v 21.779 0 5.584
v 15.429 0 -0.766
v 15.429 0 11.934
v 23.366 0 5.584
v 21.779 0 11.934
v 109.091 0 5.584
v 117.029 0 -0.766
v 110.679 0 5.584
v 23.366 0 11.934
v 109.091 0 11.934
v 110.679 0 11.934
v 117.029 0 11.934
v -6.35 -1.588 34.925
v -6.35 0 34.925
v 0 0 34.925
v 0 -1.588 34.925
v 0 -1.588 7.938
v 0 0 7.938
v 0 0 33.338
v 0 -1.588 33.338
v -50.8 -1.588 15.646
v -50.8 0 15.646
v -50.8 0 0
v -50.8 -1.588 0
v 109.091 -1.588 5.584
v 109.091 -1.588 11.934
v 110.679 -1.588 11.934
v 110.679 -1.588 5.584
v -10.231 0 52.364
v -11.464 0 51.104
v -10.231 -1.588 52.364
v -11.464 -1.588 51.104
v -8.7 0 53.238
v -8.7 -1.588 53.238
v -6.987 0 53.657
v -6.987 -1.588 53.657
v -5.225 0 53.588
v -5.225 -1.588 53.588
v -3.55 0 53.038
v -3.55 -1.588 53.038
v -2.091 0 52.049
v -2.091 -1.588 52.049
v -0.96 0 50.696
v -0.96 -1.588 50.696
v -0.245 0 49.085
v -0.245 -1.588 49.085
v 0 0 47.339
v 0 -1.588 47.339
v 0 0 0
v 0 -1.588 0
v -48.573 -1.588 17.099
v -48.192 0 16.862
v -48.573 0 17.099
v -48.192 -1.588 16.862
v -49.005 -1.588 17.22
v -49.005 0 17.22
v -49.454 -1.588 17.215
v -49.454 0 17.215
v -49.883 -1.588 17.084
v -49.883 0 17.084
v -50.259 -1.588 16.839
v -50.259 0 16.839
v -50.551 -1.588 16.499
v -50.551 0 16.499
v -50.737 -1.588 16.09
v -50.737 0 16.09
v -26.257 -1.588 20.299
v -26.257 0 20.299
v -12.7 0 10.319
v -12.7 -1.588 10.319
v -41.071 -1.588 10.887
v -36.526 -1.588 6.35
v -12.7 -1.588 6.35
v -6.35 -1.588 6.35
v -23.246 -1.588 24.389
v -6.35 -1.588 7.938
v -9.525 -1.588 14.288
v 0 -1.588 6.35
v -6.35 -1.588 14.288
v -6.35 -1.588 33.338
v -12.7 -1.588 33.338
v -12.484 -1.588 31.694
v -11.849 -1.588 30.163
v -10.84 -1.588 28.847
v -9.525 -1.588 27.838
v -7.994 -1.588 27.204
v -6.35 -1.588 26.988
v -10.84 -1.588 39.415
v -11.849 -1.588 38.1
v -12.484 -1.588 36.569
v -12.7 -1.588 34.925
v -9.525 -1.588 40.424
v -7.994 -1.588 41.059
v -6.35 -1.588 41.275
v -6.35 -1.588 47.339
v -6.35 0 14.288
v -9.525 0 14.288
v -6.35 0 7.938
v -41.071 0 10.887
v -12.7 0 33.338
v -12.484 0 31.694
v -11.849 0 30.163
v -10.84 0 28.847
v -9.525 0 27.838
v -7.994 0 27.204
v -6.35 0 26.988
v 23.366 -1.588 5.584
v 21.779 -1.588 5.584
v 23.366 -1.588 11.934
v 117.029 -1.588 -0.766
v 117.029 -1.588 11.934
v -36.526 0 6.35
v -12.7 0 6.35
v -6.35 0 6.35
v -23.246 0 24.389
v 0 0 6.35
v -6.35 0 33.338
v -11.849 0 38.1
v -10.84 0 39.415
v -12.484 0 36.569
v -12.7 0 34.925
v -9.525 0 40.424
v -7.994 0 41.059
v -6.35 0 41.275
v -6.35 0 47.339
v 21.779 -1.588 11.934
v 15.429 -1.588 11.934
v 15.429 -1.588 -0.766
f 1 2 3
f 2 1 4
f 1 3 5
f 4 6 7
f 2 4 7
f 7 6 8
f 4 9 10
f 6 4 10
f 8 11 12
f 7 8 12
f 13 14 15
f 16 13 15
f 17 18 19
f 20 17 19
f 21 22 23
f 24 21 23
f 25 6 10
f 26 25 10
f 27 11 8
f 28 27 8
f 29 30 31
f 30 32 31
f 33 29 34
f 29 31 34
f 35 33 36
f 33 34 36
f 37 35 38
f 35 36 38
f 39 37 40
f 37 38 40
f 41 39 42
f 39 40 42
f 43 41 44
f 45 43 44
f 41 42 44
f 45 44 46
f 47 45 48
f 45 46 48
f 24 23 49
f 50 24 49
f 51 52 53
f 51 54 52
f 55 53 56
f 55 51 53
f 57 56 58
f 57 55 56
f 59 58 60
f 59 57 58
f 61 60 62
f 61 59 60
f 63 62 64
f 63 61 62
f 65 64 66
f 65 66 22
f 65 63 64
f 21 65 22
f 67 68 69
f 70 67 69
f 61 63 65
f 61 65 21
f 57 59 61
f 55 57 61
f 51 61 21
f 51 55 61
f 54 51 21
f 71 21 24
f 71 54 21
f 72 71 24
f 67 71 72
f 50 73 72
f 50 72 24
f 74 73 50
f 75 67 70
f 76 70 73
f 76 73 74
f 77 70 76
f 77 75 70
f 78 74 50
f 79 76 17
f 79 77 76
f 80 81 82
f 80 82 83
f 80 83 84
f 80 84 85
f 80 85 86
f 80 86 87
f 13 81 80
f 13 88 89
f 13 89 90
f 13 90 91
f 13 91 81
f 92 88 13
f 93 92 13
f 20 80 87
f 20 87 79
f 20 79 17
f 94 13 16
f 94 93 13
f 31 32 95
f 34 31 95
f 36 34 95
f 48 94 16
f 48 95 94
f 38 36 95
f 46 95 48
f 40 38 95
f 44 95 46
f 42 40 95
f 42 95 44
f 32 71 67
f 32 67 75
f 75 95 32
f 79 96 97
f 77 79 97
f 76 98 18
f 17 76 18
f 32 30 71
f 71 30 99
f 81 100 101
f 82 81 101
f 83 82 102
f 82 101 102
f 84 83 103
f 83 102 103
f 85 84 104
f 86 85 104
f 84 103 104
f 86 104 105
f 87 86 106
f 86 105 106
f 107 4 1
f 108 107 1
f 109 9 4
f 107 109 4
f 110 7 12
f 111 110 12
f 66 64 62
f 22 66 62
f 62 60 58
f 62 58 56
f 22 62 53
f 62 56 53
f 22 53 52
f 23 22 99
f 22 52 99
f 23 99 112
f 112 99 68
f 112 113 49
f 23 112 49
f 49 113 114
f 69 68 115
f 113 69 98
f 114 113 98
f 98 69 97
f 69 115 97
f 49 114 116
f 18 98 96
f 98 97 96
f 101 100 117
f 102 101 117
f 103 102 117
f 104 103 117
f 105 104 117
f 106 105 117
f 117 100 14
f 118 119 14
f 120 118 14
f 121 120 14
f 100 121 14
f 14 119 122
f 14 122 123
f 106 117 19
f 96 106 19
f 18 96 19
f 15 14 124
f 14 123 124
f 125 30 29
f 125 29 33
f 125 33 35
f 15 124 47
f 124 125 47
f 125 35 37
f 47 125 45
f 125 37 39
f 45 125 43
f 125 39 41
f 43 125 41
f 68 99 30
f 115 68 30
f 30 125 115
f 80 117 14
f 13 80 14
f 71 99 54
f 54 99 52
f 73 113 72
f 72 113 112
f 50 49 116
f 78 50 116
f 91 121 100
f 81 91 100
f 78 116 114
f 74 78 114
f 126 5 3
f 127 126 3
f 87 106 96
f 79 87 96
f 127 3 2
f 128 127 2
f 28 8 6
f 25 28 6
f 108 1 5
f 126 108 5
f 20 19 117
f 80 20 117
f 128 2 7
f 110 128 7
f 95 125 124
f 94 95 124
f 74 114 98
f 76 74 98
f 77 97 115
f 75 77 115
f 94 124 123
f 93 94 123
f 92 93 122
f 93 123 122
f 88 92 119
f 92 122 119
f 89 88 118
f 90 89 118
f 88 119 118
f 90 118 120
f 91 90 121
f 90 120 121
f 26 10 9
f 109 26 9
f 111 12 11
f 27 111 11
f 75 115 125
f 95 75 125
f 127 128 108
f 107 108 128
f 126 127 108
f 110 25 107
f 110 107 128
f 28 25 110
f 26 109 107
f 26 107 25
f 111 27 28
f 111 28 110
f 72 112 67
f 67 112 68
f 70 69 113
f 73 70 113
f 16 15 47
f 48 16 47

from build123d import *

# Parameters (mm, degrees)
F1_DEPTH = 1.5875
F3_DEPTH = 1.5875
F4_R     = 1.5875
F5_R     = 6.35


with BuildPart() as f1:
    # F0 (on Front) → F1 (new body)
    with BuildSketch(Plane.XZ):
        Polygon((-50.8, 0), (0, 0), (0, 6.35), (-6.35, 6.35), (-6.35, 7.9375), (0, 7.9375), (0, 33.3375), (-6.35, 33.3375), (-6.35, 34.925), (0, 34.925), (0, 66.675), (-41.071236, 10.886597), (-50.8, 19.05), align=None)
        with BuildLine():
            Line((-6.35, 26.9875), (-6.35, 14.2875))
            Line((-6.35, 14.2875), (-9.525, 14.2875))
            Line((-9.525, 14.2875), (-12.7, 14.2875))
            Line((-12.7, 14.2875), (-12.7, 10.31875))
            Line((-12.7, 10.31875), (-12.7, 6.35))
            Line((-12.7, 6.35), (-36.525842, 6.35))
            Line((-36.525842, 6.35), (-26.256588, 20.299065))
            Line((-26.256588, 20.299065), (-23.245804, 24.38871))
            Line((-23.245804, 24.38871), (-6.35, 47.338834))
            Line((-6.35, 47.338834), (-6.35, 41.275))
            ThreePointArc((-6.35, 41.275), (-10.840128, 39.415128), (-12.7, 34.925))
            Line((-12.7, 34.925), (-12.7, 33.3375))
            ThreePointArc((-12.7, 33.3375), (-10.840128, 28.847372), (-6.35, 26.9875))
        make_face(mode=Mode.SUBTRACT)
        Polygon((-12.7, 14.2875), (-9.525, 14.2875), (-23.245804, 24.38871), (-26.256588, 20.299065), (-12.7, 10.31875), align=None)
    extrude(amount=F1_DEPTH)

    # F4
    f4_edges = [f1.edges().sort_by_distance(p)[0] for p in [
        (-50.8, -0.79375, 19.05),
    ]]
    fillet(f4_edges, radius=F4_R)

    # F5
    f5_edges = [f1.edges().sort_by_distance(p)[0] for p in [
        (0, -0.79375, 66.675),
    ]]
    fillet(f5_edges, radius=F5_R)


with BuildPart() as f3:
    # F2 (on Front) → F3 (new body)
    with BuildSketch(Plane.XZ):
        Polygon((21.77861, 11.93424), (15.42861, 11.93424), (15.42861, -0.76576), (66.22861, -0.76576), (66.22861, 11.93424), (23.36611, 11.93424), (23.36611, 5.58424), (21.77861, 5.58424), align=None)
        Polygon((66.22861, 11.93424), (66.22861, -0.76576), (117.02861, -0.76576), (117.02861, 11.93424), (110.67861, 11.93424), (110.67861, 5.58424), (109.09111, 5.58424), (109.09111, 11.93424), align=None)
    extrude(amount=F3_DEPTH)


solid = Compound([f1.part, f3.part])
